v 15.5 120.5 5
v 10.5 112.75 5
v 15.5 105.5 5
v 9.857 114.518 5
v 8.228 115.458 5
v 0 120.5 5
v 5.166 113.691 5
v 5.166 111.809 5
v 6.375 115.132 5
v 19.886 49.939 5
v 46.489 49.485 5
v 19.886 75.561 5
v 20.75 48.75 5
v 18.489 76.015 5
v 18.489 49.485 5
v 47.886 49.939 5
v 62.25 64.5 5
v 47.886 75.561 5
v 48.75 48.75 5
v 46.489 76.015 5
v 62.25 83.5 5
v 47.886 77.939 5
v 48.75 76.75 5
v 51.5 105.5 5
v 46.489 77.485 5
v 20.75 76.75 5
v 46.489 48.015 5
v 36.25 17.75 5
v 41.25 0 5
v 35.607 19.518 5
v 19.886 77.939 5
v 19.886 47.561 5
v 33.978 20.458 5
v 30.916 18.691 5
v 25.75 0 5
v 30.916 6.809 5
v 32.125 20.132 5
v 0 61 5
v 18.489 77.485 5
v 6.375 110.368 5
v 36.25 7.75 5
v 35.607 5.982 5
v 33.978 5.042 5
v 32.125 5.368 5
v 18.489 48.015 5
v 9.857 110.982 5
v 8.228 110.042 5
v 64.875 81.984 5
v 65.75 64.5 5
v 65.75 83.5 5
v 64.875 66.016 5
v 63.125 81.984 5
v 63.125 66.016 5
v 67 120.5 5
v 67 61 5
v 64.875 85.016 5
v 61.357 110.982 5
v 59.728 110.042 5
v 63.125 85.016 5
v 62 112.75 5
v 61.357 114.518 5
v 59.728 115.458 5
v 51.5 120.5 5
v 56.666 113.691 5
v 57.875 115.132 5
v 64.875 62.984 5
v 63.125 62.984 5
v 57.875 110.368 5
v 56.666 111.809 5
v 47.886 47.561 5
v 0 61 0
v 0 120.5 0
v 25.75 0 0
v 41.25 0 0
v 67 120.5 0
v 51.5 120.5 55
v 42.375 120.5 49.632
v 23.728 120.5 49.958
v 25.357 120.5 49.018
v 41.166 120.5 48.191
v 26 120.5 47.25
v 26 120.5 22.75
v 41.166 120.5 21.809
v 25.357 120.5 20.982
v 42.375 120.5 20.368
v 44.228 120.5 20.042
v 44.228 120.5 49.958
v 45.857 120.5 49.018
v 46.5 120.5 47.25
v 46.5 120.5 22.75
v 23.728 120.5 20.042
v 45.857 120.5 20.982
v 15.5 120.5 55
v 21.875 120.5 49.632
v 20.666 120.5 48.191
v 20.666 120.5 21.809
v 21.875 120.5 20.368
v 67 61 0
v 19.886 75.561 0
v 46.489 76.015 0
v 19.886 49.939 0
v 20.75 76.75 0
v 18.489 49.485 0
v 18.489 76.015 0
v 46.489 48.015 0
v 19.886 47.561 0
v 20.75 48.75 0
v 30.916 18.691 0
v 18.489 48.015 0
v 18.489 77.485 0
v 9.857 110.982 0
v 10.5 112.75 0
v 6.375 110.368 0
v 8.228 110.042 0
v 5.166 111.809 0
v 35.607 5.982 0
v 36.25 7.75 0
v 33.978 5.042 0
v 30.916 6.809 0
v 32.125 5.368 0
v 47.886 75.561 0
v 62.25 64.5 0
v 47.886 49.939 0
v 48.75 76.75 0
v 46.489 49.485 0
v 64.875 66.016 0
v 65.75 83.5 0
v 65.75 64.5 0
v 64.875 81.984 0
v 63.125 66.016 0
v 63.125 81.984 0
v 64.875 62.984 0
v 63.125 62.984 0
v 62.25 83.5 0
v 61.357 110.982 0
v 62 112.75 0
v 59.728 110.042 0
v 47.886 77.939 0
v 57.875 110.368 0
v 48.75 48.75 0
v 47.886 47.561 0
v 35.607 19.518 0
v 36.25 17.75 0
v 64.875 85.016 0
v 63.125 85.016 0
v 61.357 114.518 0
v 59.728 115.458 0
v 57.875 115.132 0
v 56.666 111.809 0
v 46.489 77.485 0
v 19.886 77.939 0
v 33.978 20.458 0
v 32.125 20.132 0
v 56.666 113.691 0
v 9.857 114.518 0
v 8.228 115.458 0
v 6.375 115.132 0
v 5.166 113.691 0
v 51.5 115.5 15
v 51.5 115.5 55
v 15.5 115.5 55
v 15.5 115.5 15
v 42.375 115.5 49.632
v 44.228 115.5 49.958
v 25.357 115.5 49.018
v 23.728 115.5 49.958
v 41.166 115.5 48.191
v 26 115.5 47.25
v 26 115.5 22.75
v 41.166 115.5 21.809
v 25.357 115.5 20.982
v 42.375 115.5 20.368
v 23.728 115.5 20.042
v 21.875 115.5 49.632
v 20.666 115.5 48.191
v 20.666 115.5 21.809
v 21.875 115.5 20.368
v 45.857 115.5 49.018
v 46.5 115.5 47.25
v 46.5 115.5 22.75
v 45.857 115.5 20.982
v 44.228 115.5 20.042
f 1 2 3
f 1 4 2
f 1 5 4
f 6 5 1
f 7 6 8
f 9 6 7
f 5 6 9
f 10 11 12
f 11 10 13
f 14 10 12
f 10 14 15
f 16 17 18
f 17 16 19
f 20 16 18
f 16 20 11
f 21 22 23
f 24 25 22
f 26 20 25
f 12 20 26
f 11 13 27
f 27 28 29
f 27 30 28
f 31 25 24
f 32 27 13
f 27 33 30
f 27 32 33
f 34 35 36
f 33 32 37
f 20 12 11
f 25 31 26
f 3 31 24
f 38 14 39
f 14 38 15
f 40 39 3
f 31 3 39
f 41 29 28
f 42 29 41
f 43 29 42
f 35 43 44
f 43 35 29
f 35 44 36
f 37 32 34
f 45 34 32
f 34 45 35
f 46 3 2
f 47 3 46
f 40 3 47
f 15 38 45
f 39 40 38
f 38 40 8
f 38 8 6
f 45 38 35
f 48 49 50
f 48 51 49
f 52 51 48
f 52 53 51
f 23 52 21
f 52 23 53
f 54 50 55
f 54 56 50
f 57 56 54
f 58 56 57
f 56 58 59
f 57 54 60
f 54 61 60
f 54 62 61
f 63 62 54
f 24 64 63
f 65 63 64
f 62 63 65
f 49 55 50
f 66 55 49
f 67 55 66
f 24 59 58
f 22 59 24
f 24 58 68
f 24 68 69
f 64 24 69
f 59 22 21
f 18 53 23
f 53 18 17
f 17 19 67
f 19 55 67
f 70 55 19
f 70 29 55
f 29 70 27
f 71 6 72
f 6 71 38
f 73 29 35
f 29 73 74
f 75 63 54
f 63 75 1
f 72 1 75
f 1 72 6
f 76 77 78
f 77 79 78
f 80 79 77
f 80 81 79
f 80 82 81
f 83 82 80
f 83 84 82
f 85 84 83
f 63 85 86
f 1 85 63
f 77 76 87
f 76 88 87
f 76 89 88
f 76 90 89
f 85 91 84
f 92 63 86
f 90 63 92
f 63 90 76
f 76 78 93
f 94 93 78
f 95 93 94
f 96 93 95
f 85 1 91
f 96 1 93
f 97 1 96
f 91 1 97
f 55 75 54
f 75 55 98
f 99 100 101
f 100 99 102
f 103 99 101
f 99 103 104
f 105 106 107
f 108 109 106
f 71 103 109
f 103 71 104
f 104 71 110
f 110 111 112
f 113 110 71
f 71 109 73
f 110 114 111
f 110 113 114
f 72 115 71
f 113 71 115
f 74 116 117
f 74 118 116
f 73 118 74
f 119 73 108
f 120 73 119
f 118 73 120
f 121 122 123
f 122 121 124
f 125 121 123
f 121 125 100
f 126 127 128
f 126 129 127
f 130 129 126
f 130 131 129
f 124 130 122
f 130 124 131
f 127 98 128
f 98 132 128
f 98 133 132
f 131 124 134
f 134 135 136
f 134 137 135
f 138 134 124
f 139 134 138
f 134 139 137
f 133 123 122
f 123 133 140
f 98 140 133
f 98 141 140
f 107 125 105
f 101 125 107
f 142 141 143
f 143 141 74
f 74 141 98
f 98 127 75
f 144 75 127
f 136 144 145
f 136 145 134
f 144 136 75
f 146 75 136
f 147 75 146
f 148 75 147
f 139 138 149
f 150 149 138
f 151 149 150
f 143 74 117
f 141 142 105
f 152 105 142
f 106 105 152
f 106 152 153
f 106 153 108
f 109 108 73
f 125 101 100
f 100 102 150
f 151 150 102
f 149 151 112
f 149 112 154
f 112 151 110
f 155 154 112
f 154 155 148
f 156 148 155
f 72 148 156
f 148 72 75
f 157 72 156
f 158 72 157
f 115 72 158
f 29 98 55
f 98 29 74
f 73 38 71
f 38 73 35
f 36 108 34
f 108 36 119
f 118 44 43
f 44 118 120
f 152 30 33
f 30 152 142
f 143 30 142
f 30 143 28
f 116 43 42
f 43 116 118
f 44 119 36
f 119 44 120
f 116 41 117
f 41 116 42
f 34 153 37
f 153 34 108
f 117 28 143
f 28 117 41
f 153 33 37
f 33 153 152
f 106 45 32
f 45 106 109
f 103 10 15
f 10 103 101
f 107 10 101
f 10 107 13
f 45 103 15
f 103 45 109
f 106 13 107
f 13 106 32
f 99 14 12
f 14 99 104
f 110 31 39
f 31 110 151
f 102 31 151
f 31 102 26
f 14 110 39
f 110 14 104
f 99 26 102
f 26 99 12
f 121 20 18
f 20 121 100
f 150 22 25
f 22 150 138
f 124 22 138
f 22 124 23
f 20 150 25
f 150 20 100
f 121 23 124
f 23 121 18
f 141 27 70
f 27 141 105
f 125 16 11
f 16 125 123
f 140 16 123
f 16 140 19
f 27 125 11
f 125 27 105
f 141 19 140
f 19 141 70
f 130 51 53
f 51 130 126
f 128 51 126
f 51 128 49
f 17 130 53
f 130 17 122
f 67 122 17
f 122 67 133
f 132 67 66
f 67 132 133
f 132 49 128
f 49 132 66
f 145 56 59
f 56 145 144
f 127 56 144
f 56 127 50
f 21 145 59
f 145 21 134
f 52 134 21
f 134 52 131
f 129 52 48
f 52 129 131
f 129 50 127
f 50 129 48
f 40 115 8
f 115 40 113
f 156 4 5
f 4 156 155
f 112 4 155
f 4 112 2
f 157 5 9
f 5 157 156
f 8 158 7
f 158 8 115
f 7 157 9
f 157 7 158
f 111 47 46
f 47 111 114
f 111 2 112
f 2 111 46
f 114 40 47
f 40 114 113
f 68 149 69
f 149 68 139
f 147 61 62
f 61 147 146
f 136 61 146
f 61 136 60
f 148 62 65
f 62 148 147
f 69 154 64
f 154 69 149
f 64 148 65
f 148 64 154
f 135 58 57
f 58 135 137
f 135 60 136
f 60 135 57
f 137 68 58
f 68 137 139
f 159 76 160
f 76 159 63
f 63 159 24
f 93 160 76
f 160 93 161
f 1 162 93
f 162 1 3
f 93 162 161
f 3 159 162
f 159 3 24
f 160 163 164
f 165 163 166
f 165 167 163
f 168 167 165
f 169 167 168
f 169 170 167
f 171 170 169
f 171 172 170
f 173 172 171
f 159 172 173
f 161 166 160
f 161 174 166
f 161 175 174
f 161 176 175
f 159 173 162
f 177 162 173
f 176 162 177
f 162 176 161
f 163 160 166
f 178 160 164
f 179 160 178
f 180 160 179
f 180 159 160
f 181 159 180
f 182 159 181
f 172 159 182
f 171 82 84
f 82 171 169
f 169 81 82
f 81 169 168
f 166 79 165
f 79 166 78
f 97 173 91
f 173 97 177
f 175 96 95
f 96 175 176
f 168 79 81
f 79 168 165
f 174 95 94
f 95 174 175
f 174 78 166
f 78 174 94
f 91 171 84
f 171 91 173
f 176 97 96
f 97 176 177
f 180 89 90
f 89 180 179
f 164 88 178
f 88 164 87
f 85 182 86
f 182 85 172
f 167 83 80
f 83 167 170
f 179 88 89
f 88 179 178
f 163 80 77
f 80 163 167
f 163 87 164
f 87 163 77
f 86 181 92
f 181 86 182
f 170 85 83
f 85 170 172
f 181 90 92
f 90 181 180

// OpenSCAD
// Uncomment before final render
//$fa = 0.01;
//$fs = 0.25;

module xAxisBottomCarriage() {
  union() {
    difference() {
      hull() {
        translate([25.75, 0, 0]) {
          cube([15.5, 25.5, 5]);
        }
        translate([0, 61, 0]) {
          cube([15.5, 15.5, 5]);
        }
        translate([51.5, 61, 0]) {
          cube([15.5, 15.5, 5]);
        }
        translate([0, 105, 0]) {
          cube([15.5, 15.5, 5]);
        }
        translate([51.5, 105, 0]) {
          cube([15.5, 15.5, 5]);
        }
      }
      hull() {
        translate([33.5, 7.75, -1]) {
          cylinder(7, 2.75, 2.75);
        }
        translate([33.5, 17.75, -1]) {
          cylinder(7, 2.75, 2.75);
        }
      }
      translate([19.5, 48.75, -1]) {
        cylinder(7, 1.25, 1.25);
      }
      translate([19.5, 76.75, -1]) {
        cylinder(7, 1.25, 1.25);
      }
      translate([47.5, 76.75, -1]) {
        cylinder(7, 1.25, 1.25);
      }
      translate([47.5, 48.75, -1]) {
        cylinder(7, 1.25, 1.25);
      }
      translate([64, 64.5, -1]) {
        cylinder(7, 1.75, 1.75);
      }
      translate([64, 83.5, -1]) {
        cylinder(7, 1.75, 1.75);
      }
      translate([7.75, 112.75, -1]) {
        cylinder(7, 2.75, 2.75);
      }
      translate([59.25, 112.75, -1]) {
        cylinder(7, 2.75, 2.75);
      }
    }
    translate([15.5, 105.5, 5]) {
      difference() {
        cube([36, 15, 50]);
        translate([-1, 0, 0]) {
          rotate([45, 0, 0]) {
            cube([41, sqrt(200), sqrt(200)]);
          }
        }
        translate([-1, -1, 10]) {
          cube([41, 11, 41]);
        }
        hull() {
          translate([7.75, 9, 17.75]) {
            rotate([-90, 0, 0]) {
              cylinder(7, 2.75, 2.75);
            }
          }
          translate([7.75, 9, 42.25]) {
            rotate([-90, 0, 0]) {
              cylinder(7, 2.75, 2.75);
            }
          }
        }
        hull() {
          translate([28.25, 9, 17.75]) {
            rotate([-90, 0, 0]) {
              cylinder(7, 2.75, 2.75);
            }
          }
          translate([28.25, 9, 42.25]) {
            rotate([-90, 0, 0]) {
              cylinder(7, 2.75, 2.75);
            }
          }
        }
      }
    }
  }
}

xAxisBottomCarriage();
